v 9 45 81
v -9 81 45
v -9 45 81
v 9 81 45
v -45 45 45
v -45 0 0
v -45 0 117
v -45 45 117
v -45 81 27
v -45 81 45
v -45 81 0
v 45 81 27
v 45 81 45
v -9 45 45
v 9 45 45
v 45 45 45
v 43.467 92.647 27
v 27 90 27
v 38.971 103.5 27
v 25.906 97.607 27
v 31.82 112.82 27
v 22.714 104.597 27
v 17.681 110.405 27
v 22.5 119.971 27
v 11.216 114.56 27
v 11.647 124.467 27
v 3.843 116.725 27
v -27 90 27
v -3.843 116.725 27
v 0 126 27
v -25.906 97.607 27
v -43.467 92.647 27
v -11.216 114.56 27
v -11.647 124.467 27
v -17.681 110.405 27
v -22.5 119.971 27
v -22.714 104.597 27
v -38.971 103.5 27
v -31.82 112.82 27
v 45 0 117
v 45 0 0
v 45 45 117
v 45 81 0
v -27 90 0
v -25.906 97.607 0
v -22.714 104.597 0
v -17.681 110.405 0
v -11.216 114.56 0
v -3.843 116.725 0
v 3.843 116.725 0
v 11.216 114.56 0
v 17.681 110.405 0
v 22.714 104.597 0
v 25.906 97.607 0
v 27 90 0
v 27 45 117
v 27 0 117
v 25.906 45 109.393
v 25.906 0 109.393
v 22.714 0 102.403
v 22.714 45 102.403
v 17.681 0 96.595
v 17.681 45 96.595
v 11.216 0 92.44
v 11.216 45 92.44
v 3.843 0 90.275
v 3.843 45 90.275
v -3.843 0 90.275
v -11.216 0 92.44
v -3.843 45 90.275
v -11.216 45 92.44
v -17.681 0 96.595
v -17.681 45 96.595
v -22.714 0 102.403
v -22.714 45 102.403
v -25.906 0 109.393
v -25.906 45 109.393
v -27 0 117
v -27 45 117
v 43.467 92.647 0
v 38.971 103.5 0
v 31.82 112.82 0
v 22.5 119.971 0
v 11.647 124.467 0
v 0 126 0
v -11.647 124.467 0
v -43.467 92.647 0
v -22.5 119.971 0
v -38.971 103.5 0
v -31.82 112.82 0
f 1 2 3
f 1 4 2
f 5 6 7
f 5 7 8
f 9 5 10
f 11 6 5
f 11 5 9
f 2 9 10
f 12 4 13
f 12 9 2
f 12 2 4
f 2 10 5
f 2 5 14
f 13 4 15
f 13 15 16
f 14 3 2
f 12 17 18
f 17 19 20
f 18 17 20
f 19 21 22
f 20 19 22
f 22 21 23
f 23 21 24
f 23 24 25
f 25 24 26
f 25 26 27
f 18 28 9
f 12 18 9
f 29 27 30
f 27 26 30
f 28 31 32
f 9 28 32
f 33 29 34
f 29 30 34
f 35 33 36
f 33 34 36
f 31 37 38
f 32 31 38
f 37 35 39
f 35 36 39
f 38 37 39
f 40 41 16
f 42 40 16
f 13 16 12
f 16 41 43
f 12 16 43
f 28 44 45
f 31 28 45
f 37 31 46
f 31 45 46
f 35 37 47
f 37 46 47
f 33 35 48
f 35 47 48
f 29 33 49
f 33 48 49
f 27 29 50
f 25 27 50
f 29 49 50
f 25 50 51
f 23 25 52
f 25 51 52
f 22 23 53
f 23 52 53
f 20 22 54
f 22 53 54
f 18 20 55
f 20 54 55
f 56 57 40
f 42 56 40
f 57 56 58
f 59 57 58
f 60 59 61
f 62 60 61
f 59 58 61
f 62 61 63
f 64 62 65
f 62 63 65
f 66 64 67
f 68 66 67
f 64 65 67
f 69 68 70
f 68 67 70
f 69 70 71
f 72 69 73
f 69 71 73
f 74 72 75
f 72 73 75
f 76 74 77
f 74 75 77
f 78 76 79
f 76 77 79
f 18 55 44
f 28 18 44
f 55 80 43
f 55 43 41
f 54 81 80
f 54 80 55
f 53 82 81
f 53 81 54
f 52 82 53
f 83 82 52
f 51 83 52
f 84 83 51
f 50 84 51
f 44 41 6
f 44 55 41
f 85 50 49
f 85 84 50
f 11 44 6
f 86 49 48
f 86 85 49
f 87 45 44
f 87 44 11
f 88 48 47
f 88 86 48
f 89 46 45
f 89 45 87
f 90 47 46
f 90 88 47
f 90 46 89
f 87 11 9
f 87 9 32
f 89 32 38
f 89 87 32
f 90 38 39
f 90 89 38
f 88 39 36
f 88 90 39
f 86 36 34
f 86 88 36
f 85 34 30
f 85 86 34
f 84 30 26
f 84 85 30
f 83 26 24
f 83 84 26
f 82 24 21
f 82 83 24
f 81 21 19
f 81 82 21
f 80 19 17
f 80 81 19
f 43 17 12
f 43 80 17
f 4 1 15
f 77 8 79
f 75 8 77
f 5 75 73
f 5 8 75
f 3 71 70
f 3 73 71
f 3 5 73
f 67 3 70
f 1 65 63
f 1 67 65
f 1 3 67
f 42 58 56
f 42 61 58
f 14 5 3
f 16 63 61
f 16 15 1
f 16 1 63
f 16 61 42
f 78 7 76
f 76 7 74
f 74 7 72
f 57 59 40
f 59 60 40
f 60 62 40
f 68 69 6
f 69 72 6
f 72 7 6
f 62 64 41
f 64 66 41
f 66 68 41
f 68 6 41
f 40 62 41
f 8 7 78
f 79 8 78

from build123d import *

# Parameters (mm, degrees)
SKETCH1_W           = 90
SKETCH1_H           = 45
BOSS_EXTRUDE1_DEPTH = 117
SKETCH1_3_W         = 90
SKETCH1_3_H         = 36
BOSS_EXTRUDE2_DEPTH = 45
BOSS_EXTRUDE3_DEPTH = 27
CUT_EXTRUDE1_REACH  = 151.248
BOSS_EXTRUDE4_DEPTH = 9


with BuildPart() as part:
    # Sketch1 → Boss-Extrude1 (new body)
    with BuildSketch(Plane.XY):
        with Locations((0, 22.5)):
            Rectangle(SKETCH1_W, SKETCH1_H)
    extrude(amount=BOSS_EXTRUDE1_DEPTH)

    # Sketch1<3> → Boss-Extrude2 (add)
    with BuildSketch(Plane.XY):
        with Locations((0, 63)):
            Rectangle(SKETCH1_3_W, SKETCH1_3_H)
    extrude(amount=BOSS_EXTRUDE2_DEPTH)

    # Sketch1<4> → Boss-Extrude3 (add)
    with BuildSketch(Plane.XY):
        with BuildLine():
            Line((-45, 81), (45, 81))
            ThreePointArc((45, 81), (0, 126), (-45, 81))
        make_face()
        with BuildLine():
            ThreePointArc((-27, 90), (0, 117), (27, 90))
            Line((27, 90), (-27, 90))
        make_face(mode=Mode.SUBTRACT)
    extrude(amount=BOSS_EXTRUDE3_DEPTH)

    # Sketch5 → Cut-Extrude1 (cut, up to next)
    with BuildSketch(Plane(origin=(0, 45, 0), x_dir=(1, 0, 0), z_dir=(0, 1, 0)), mode=Mode.PRIVATE) as cut_extrude1_sk1:
        with BuildLine():
            Line((-27, -117), (27, -117))
            ThreePointArc((27, -117), (0, -90), (-27, -117))
        make_face()
    cut_extrude1_tool1 = extrude(cut_extrude1_sk1.sketch, amount=-CUT_EXTRUDE1_REACH, mode=Mode.PRIVATE) & part.part
    add(cut_extrude1_tool1.solids().sort_by_distance((0, 45, 105.540844))[0], mode=Mode.SUBTRACT)

    # Sketch7 → Boss-Extrude4 (add, symmetric)
    with BuildSketch(Plane(origin=(0, 0, 0), x_dir=(0, 0, -1), z_dir=(1, 0, 0))):
        Polygon((-45, 81), (-81, 45), (-45, 45), align=None)
    extrude(amount=BOSS_EXTRUDE4_DEPTH, both=True)


solid = part.part
